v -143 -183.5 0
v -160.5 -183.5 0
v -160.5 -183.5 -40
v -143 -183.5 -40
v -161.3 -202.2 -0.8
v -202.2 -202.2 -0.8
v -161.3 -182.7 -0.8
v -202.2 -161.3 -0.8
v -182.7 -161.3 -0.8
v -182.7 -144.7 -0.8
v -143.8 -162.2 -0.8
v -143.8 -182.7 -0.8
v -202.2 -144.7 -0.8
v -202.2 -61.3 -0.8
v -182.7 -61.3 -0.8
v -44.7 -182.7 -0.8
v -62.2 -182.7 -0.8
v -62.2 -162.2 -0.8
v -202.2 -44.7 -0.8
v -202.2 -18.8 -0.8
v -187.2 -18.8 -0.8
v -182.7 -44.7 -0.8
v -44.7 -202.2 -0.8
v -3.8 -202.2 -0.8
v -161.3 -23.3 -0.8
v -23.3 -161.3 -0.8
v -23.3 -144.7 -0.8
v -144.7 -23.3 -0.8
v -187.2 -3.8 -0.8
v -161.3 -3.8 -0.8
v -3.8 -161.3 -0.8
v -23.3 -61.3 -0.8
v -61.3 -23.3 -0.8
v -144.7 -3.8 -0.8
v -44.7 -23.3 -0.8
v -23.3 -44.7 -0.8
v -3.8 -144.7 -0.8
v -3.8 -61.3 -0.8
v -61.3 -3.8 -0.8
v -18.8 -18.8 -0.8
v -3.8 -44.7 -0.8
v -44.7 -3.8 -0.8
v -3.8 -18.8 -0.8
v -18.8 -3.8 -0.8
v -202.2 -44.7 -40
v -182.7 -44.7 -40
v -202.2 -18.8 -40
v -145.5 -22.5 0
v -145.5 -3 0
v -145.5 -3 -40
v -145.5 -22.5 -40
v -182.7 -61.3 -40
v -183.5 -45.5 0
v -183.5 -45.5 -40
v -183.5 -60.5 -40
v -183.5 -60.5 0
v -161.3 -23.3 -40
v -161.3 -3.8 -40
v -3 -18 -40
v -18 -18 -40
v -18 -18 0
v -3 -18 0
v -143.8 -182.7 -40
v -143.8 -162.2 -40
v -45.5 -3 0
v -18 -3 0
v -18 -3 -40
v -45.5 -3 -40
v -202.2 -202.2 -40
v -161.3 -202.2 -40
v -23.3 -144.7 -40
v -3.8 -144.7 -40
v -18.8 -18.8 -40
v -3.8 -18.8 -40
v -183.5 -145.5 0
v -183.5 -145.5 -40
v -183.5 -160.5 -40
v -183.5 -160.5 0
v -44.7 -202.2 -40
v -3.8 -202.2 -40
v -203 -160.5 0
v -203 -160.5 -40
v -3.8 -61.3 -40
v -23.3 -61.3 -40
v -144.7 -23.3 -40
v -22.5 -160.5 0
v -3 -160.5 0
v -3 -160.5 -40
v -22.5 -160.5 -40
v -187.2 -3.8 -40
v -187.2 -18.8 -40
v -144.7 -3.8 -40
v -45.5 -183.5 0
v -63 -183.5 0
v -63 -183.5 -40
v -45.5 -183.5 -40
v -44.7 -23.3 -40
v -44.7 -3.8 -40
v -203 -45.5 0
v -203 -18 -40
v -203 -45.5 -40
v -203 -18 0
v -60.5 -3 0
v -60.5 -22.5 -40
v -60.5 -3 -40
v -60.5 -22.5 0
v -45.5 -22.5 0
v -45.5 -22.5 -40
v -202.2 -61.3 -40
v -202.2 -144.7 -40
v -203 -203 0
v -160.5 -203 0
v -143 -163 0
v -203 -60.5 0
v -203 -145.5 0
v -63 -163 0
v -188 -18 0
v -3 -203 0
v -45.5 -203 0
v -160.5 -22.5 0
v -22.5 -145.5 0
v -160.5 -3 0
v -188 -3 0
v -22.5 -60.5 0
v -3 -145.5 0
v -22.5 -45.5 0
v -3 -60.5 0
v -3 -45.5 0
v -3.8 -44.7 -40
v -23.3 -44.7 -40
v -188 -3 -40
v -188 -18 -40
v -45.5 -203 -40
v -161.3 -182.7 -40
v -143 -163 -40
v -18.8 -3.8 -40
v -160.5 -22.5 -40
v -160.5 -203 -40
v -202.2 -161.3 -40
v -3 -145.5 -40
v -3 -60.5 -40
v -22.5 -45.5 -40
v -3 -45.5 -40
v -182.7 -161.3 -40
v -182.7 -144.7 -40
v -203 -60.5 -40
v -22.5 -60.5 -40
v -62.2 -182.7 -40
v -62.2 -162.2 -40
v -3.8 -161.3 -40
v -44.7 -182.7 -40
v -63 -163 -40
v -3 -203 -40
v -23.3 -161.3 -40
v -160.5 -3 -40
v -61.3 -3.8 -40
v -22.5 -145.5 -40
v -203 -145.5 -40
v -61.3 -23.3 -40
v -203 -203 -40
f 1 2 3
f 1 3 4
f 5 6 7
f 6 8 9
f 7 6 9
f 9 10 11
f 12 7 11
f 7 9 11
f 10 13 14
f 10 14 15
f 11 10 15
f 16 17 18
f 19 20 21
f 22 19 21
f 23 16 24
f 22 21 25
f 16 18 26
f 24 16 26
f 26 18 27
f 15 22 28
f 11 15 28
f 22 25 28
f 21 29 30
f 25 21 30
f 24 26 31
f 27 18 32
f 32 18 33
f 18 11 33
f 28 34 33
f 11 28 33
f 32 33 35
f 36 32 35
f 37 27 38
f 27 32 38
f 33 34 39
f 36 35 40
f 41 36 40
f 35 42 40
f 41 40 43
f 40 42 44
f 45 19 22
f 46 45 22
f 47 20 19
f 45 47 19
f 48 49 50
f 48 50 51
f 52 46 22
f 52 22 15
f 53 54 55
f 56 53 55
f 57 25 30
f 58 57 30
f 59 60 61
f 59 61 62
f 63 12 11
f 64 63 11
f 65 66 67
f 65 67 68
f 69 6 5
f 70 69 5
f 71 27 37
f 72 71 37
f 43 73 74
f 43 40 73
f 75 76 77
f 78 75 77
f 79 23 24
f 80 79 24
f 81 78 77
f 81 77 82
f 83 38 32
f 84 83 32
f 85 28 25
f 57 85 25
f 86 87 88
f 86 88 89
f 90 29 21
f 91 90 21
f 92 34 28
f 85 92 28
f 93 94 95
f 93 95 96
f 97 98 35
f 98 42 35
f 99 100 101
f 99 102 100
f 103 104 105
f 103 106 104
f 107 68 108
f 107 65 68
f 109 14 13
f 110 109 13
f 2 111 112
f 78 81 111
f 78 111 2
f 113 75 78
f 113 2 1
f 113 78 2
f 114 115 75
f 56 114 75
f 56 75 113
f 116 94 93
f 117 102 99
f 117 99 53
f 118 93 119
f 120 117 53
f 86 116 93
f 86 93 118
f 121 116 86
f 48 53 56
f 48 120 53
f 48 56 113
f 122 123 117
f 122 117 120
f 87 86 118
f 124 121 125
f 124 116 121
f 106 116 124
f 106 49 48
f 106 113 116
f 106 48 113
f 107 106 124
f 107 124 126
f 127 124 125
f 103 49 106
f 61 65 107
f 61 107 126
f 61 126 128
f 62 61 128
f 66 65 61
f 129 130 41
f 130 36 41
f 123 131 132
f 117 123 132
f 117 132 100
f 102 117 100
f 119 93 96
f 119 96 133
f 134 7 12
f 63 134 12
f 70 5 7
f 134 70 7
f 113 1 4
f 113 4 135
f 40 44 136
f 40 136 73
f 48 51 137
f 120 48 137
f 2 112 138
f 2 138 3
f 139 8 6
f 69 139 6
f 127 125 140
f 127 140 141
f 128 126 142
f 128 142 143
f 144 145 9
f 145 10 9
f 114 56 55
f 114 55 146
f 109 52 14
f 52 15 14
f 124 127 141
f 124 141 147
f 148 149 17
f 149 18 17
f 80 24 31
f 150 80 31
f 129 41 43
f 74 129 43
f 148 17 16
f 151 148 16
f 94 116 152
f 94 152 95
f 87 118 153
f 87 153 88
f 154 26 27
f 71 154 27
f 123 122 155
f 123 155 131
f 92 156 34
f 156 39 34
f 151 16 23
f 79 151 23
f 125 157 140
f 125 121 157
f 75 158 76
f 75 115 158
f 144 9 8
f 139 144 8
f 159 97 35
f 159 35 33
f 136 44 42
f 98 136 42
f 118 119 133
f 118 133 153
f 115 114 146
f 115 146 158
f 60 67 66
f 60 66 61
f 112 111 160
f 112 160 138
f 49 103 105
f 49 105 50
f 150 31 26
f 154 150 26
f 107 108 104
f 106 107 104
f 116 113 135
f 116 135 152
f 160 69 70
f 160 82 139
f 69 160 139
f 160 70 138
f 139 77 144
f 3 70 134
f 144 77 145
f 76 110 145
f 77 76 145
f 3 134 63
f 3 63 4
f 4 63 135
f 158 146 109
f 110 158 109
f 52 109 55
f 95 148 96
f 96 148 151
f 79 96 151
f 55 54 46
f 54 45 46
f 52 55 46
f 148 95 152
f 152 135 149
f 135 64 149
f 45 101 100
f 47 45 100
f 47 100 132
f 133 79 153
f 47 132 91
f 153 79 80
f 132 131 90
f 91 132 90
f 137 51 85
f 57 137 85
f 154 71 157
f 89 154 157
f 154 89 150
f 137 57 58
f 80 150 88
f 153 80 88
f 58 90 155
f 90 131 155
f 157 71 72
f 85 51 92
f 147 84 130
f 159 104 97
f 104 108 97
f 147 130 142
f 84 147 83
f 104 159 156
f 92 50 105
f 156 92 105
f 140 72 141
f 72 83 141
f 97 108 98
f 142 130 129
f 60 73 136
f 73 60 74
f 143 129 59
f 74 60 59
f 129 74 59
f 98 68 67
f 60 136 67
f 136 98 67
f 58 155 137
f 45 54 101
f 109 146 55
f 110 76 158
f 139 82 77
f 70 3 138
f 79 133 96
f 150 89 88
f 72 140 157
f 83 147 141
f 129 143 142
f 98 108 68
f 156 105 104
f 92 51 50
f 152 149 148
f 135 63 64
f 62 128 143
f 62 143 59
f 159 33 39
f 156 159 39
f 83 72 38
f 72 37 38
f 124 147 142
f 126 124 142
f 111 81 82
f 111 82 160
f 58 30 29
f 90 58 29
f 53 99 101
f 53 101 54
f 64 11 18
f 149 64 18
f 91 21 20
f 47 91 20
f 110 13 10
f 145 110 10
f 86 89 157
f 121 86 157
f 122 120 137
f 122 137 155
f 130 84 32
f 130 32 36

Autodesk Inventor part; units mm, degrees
ref_plane "YZ Plane" through (0, 0, 0) normal (1, 0, 0) x (0, 1, 0)
ref_plane "XZ Plane" through (0, 0, 0) normal (0, 1, 0) x (-1, 0, 0)
ref_plane "XY Plane" through (0, 0, 0) normal (0, 0, 1) x (1, 0, 0)
sketch "Boceto1" plane through (0, 0, 0) normal (0, 0, 1) x (1, 0, 0)
  line L0 (0, -12.2) -> (0, -206) projected
  line L1 (-3, -206) -> (-3, -12.2) projected
  line L2 (0, -206) -> (-3, -206) projected
  line L3 (-206, -203) -> (-206, 0) projected
  line L4 (-203, 0) -> (-203, -203) projected
  line L5 (-206, 0) -> (-203, 0) projected
  line L6 (-203, -203) -> (-3, -203)
  line L7 (-3, -203) -> (-3, -3)
  line L8 (-3, -3) -> (-203, -3)
  line L9 (-203, -3) -> (-203, -203)
  line L10 (-103, -203) -> (-103, -163)
  line L11 (-103, -163) -> (-143, -163)
  line L12 (-143, -163) -> (-63, -163)
  line L13 (-63, -163) -> (-63, -203)
  line L14 (-63, -203) -> (-143, -203)
  line L15 (-143, -203) -> (-143, -163)
  line L16 (-147.5, -3) -> (-147.5, -20.5)
  line L17 (-158.5, -20.5) -> (-158.5, -3)
  line L18 (-147.5, -3) -> (-147.5, -20.5)
  line L19 (-158.5, -3) -> (-147.5, -3) projected
  circle A0 centre (-191, -53) radius 2.1 projected
  line L20 (-185.5, -58.5) -> (-203, -58.5) projected
  line L21 (-185.5, -47.5) -> (-185.5, -58.5) projected
  line L22 (-203, -47.5) -> (-185.5, -47.5) projected
  line L23 (-203, -58.5) -> (-203, -47.5) projected
  circle A1 centre (-53, -15) radius 2.1 projected
  line L24 (-58.5, -20.5) -> (-58.5, -3) projected
  line L25 (-47.5, -20.5) -> (-58.5, -20.5) projected
  line L26 (-47.5, -3) -> (-47.5, -20.5) projected
  line L27 (-58.5, -3) -> (-47.5, -3) projected
  circle A2 centre (-15, -53) radius 2.1 projected
  line L28 (-20.5, -47.5) -> (-3, -47.5) projected
  line L29 (-20.5, -58.5) -> (-20.5, -47.5) projected
  line L30 (-3, -58.5) -> (-20.5, -58.5) projected
  line L31 (-3, -47.5) -> (-3, -58.5) projected
  line L32 (-20.5, -147.5) -> (-3, -147.5) projected
  line L33 (-3, -158.5) -> (-20.5, -158.5) projected
  line L34 (-20.5, -158.5) -> (-20.5, -147.5) projected
  line L35 (-47.5, -185.5) -> (-47.5, -203) projected
  line L36 (-58.5, -203) -> (-58.5, -185.5) projected
  line L37 (-58.5, -185.5) -> (-47.5, -185.5) projected
  line L38 (-158.5, -203) -> (-158.5, -185.5) projected
  line L39 (-158.5, -185.5) -> (-147.5, -185.5) projected
  line L40 (-147.5, -185.5) -> (-147.5, -203) projected
  line L41 (-185.5, -158.5) -> (-203, -158.5) projected
  line L42 (-203, -147.5) -> (-185.5, -147.5) projected
  line L43 (-185.5, -147.5) -> (-185.5, -158.5) projected
  line L44 (-158.5, -3) -> (-147.5, -3)
  line L45 (-147.5, -3) -> (-147.5, -20.5)
  line L46 (-158.5, -20.5) -> (-158.5, -3)
  line L47 (-158.5, -3) -> (-147.5, -3)
  line L48 (-147.5, -3) -> (-147.5, -20.5)
  line L49 (-147.5, -20.5) -> (-158.5, -20.5)
  line L50 (-158.5, -20.5) -> (-158.5, -3)
  line L51 (-147.5, -22.5) -> (-160.5, -22.5)
  line L52 (-160.5, -22.5) -> (-160.5, -3)
  line L53 (-160.5, -3) -> (-145.5, -3)
  line L54 (-145.5, -3) -> (-145.5, -22.5)
  line L55 (-145.5, -22.5) -> (-160.5, -22.5)
  line L56 (-160.5, -22.5) -> (-160.5, -3)
  circle A3 centre (-103, -103) radius 47 projected
  line L57 (-47.5, -22.5) -> (-60.5, -22.5)
  line L58 (-60.5, -22.5) -> (-60.5, -3)
  line L59 (-45.5, -3) -> (-45.5, -22.5)
  line L60 (-45.5, -22.5) -> (-60.5, -22.5)
  line L61 (-60.5, -22.5) -> (-60.5, -3)
  line L62 (-183.5, -160.5) -> (-203, -160.5)
  line L63 (-203, -147.5) -> (-185.5, -147.5)
  line L64 (-203, -147.5) -> (-185.5, -147.5)
  line L65 (-185.5, -158.5) -> (-203, -158.5)
  line L66 (-183.5, -160.5) -> (-203, -160.5)
  line L67 (-185.5, -158.5) -> (-203, -158.5)
  line L68 (-185.5, -158.5) -> (-203, -158.5)
  line L69 (-183.5, -147.5) -> (-183.5, -160.5)
  line L70 (-203, -147.5) -> (-185.5, -147.5)
  line L71 (-203, -147.5) -> (-185.5, -147.5)
  line L72 (-185.5, -147.5) -> (-185.5, -158.5)
  line L73 (-183.5, -145.5) -> (-183.5, -160.5)
  line L74 (-203, -145.5) -> (-183.5, -145.5)
  line L75 (-183.5, -47.5) -> (-183.5, -60.5)
  line L76 (-183.5, -45.5) -> (-183.5, -60.5)
  line L77 (-183.5, -60.5) -> (-203, -60.5)
  line L78 (-183.5, -60.5) -> (-203, -60.5)
  line L79 (-203, -45.5) -> (-183.5, -45.5)
  line L80 (-45.5, -183.5) -> (-45.5, -203)
  line L81 (-58.5, -203) -> (-58.5, -185.5)
  line L82 (-58.5, -203) -> (-58.5, -185.5)
  line L83 (-47.5, -185.5) -> (-47.5, -203)
  line L84 (-45.5, -183.5) -> (-45.5, -203)
  line L85 (-47.5, -185.5) -> (-47.5, -203)
  line L86 (-47.5, -185.5) -> (-47.5, -203)
  line L87 (-58.5, -183.5) -> (-45.5, -183.5)
  line L88 (-58.5, -203) -> (-58.5, -185.5)
  line L89 (-58.5, -203) -> (-58.5, -185.5)
  line L90 (-58.5, -185.5) -> (-47.5, -185.5)
  line L91 (-60.5, -183.5) -> (-45.5, -183.5)
  line L92 (-60.5, -203) -> (-60.5, -183.5)
  line L93 (-158.5, -183.5) -> (-145.5, -183.5)
  line L94 (-160.5, -183.5) -> (-145.5, -183.5)
  line L95 (-145.5, -183.5) -> (-145.5, -203)
  line L96 (-145.5, -183.5) -> (-145.5, -203)
  line L97 (-160.5, -203) -> (-160.5, -183.5)
  line L98 (-22.5, -45.5) -> (-3, -45.5)
  line L99 (-3, -58.5) -> (-20.5, -58.5)
  line L100 (-3, -58.5) -> (-20.5, -58.5)
  line L101 (-20.5, -47.5) -> (-3, -47.5)
  line L102 (-22.5, -45.5) -> (-3, -45.5)
  line L103 (-20.5, -47.5) -> (-3, -47.5)
  line L104 (-20.5, -47.5) -> (-3, -47.5)
  line L105 (-22.5, -58.5) -> (-22.5, -45.5)
  line L106 (-3, -58.5) -> (-20.5, -58.5)
  line L107 (-3, -58.5) -> (-20.5, -58.5)
  line L108 (-20.5, -58.5) -> (-20.5, -47.5)
  line L109 (-22.5, -60.5) -> (-22.5, -45.5)
  line L110 (-3, -60.5) -> (-22.5, -60.5)
  line L111 (-22.5, -158.5) -> (-22.5, -145.5)
  line L112 (-22.5, -160.5) -> (-22.5, -145.5)
  line L113 (-22.5, -145.5) -> (-3, -145.5)
  line L114 (-22.5, -145.5) -> (-3, -145.5)
  line L115 (-3, -160.5) -> (-22.5, -160.5)
  line L116 (-145.5, -183.5) -> (-60.5, -183.5)
  line L117 (-3, -3) -> (-18, -3)
  line L118 (-18, -3) -> (-18, -18)
  line L119 (-18, -18) -> (-3, -18)
  line L120 (-3, -18) -> (-3, -3)
  line L121 (-203, -3) -> (-188, -3)
  line L122 (-188, -3) -> (-188, -18)
  line L123 (-188, -18) -> (-203, -18)
  line L124 (-203, -18) -> (-203, -3)
  line L125 (-206, -203) -> (-203, -203) projected
  line L126 (0, -12.2) -> (-3, -12.2) projected
  point P0 (0, 0)
  point P1 (-3, -203)
  point P2 (-3, -160.5)
  point P3 (-3, -145.5)
  point P4 (-3, -60.5)
  point P5 (-3, -45.5)
  point P6 (-63, -183.5)
  point P7 (-143, -183.5)
  point P8 (-3, -18)
  dimension "d3" = 40
  dimension "d4" = 40
  dimension "d5" = 80
  dimension "d6" = 2
  dimension "d7" = 15
  dimension "d8" = 15
  dimension "d11" = 360
  dimension "d13" = 15
  dimension "d14" = 15
  dimension "d15" = 15
extrude "Extrusión1" add sketch "Boceto1" against normal blind 40 contours L1 L98 L105 L109 L110 L113 L111 L112 L115 L6 L80 L87 L91 L116 L13 L12 L11 L15 L93 L94 L97 L4 L62 L69 L73 L74 L77 L75 L76 L79 L123 L122 L8 L52 L51 L55 L54 L58 L57 L60 L59 L118 L119 | A3
shell "Vaciado1" thickness 0.8 removed faces 1 at (-103, -69.3333, -40)
properties part number "Contrapeso"
